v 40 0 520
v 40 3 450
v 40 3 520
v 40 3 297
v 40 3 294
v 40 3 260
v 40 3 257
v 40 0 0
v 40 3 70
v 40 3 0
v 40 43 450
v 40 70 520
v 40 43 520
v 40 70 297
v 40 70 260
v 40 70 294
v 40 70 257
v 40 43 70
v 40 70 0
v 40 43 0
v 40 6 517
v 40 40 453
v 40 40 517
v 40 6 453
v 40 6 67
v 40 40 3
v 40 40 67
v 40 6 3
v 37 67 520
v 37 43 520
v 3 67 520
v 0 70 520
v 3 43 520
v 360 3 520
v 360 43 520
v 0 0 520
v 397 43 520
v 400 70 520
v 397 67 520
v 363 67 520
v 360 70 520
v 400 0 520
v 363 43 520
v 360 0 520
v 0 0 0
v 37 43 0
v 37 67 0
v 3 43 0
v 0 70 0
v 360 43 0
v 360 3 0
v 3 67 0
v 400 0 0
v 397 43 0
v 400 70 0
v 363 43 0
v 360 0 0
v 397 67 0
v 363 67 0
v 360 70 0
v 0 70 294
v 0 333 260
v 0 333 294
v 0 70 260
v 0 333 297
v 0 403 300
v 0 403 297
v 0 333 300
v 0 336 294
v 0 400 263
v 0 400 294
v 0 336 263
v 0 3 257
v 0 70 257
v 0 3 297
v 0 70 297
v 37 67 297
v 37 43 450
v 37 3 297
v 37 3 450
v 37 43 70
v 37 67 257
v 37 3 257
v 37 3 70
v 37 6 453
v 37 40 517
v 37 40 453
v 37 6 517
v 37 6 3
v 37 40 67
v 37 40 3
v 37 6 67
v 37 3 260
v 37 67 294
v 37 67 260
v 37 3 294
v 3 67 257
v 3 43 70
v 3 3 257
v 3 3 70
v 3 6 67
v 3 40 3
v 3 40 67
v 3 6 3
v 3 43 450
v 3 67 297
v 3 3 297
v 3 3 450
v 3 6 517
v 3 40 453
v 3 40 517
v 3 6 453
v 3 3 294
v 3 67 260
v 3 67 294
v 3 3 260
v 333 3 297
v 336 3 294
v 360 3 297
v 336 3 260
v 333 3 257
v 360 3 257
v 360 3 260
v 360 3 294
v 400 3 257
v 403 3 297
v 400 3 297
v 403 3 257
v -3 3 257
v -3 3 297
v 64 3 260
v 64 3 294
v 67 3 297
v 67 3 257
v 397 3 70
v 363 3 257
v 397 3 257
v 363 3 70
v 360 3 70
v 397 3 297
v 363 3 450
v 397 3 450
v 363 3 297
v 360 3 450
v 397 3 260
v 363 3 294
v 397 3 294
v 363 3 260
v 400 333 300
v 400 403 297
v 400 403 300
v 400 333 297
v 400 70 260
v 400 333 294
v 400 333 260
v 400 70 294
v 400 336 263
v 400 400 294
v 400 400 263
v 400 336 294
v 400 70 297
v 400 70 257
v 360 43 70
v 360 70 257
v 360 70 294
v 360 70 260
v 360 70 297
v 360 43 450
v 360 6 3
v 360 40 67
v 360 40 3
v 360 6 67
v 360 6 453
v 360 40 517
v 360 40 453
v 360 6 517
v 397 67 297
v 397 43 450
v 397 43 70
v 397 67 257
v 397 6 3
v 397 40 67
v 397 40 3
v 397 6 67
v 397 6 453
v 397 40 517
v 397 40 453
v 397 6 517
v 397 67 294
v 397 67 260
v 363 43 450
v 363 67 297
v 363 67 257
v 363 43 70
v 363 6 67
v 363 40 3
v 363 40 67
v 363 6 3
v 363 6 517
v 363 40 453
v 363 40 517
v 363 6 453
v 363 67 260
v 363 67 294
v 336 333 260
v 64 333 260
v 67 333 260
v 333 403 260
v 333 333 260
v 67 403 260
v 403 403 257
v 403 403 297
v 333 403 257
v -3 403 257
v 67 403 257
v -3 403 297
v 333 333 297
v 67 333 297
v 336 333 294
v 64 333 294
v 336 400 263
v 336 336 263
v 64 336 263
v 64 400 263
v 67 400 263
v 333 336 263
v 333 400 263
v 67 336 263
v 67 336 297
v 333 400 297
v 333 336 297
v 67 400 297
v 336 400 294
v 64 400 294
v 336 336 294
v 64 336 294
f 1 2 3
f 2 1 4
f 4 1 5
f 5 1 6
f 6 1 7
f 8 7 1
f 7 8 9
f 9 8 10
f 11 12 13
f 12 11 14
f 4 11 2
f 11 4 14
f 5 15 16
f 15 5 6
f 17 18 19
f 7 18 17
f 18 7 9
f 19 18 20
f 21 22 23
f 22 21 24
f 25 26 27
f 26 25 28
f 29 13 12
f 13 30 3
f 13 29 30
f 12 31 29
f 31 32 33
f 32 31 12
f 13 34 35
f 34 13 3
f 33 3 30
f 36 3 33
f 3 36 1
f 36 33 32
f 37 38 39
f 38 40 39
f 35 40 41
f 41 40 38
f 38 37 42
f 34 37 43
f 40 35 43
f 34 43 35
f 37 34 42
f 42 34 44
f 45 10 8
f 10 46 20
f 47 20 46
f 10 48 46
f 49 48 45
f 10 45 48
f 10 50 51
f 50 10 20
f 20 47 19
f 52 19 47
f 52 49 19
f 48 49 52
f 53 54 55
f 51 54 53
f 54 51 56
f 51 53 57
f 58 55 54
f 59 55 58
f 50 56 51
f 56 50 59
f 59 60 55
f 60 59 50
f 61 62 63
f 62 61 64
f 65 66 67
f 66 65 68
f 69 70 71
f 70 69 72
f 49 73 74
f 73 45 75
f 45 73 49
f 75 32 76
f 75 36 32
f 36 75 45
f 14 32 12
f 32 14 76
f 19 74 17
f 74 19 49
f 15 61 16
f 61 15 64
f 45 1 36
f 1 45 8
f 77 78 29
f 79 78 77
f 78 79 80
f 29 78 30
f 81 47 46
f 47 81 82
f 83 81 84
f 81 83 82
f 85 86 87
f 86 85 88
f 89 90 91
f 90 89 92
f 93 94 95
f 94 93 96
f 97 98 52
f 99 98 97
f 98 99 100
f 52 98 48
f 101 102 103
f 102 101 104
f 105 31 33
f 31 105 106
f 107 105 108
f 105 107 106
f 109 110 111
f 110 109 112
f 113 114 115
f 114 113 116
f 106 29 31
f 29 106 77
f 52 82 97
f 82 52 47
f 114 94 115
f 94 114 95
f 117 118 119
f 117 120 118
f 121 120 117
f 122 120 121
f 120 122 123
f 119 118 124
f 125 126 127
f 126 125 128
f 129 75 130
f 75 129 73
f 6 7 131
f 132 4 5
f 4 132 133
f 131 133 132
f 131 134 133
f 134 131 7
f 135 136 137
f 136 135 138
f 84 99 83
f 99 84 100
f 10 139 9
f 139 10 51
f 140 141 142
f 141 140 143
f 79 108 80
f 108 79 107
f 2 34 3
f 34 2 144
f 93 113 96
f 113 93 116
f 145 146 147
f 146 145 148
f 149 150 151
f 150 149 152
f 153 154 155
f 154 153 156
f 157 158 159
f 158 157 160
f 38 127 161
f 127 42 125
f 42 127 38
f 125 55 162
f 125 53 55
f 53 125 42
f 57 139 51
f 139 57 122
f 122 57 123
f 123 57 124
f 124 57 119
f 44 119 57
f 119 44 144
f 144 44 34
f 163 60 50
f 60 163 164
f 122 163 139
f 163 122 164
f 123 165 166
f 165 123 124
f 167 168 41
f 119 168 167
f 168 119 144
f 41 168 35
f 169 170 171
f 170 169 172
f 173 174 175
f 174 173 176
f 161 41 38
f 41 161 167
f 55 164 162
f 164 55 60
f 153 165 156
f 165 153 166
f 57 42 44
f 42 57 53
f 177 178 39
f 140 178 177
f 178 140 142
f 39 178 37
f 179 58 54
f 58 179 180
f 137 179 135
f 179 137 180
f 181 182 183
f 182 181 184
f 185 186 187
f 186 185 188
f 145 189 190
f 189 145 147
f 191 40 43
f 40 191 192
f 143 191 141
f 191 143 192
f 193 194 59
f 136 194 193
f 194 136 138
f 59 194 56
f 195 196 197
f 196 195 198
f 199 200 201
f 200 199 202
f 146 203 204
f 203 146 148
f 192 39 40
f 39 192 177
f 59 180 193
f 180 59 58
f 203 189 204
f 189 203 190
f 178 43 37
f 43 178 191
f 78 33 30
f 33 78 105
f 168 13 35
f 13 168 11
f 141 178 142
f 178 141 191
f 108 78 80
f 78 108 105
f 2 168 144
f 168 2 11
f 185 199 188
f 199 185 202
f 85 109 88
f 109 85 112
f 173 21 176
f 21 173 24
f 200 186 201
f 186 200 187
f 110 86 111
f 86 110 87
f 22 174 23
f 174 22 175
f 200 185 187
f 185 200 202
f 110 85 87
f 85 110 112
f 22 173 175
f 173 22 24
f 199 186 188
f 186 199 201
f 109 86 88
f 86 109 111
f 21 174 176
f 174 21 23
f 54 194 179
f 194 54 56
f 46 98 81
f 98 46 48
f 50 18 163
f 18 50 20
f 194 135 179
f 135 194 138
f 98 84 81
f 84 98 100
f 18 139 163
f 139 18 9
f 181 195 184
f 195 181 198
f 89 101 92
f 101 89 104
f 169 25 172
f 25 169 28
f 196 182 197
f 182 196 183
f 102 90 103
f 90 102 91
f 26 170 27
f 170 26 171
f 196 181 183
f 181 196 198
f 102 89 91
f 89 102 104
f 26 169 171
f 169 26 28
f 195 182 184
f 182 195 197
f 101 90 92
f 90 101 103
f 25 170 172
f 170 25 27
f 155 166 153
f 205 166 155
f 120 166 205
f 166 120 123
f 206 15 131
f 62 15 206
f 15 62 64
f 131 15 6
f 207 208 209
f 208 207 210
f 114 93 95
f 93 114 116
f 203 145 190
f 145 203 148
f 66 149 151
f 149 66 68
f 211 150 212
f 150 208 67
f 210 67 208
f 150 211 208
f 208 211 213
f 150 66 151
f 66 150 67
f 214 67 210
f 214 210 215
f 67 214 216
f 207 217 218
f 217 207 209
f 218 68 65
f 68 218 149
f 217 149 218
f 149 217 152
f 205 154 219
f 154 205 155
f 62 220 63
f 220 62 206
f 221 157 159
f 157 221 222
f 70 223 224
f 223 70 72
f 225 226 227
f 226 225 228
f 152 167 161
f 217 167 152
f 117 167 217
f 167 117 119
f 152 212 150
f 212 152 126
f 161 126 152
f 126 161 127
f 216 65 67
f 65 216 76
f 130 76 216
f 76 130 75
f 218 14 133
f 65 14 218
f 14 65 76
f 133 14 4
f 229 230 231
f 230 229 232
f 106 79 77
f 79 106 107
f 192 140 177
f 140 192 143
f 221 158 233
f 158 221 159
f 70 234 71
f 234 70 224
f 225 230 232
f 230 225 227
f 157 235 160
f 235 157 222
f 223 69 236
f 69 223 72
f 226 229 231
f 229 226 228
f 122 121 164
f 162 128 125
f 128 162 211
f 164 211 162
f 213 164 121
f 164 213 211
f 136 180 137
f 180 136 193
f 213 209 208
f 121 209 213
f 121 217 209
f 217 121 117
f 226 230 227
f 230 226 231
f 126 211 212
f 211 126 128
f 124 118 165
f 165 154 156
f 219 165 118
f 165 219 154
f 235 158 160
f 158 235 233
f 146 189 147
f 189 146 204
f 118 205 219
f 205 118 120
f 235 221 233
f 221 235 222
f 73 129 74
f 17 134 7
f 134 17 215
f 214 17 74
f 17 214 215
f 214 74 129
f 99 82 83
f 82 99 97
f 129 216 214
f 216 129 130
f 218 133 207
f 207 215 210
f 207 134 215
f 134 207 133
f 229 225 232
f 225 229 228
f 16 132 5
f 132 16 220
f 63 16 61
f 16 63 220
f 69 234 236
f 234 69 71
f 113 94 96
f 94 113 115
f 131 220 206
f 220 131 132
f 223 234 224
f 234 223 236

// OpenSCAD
// file: build.scad
module perfil_h(dimx, dimy, length, width) {
    difference() {
        cube([dimx, dimy, length], center=false);
        translate([width, width, 0])
        cube([dimx - 2 * width, dimy - 2 * width, length], center = width, width);
        }
};
perfil_h(40, 70, 520, 3);
// main file
//include <build.scad>
use <build.scad>

/* translate = position on plane */
/* perfil_h = size of profiles */

rotate ([0,0,0]) translate ([0,0,0]) perfil_h(40, 70, 520, 3) ;// Y axis frame
rotate ([0,0,0]) translate ([360,0,0]) perfil_h(40, 70, 520, 3); // Y axis frame

rotate ([-90,0,-90]) translate ([-43,-520,3]) perfil_h(40, 70, 394, 3);// X axis frame
rotate ([-90,0,-90]) translate ([-43,-70,3]) perfil_h(40, 70, 394, 3);// X axis frame

// Complete the X - Z, frame securing horizontal X axis and vertical Z axis movents
rotate ([90,90,90]) translate ([-300,333,0]) perfil_h(40, 70, 400, 3);// X axis frame top

rotate ([0,90,90]) translate ([-297,-403,3]) perfil_h(40, 70, 400, 3);// Z axis frame
rotate ([0,90,90]) translate ([-297,-67,3]) perfil_h(40, 70, 400, 3);// Z axis frame
